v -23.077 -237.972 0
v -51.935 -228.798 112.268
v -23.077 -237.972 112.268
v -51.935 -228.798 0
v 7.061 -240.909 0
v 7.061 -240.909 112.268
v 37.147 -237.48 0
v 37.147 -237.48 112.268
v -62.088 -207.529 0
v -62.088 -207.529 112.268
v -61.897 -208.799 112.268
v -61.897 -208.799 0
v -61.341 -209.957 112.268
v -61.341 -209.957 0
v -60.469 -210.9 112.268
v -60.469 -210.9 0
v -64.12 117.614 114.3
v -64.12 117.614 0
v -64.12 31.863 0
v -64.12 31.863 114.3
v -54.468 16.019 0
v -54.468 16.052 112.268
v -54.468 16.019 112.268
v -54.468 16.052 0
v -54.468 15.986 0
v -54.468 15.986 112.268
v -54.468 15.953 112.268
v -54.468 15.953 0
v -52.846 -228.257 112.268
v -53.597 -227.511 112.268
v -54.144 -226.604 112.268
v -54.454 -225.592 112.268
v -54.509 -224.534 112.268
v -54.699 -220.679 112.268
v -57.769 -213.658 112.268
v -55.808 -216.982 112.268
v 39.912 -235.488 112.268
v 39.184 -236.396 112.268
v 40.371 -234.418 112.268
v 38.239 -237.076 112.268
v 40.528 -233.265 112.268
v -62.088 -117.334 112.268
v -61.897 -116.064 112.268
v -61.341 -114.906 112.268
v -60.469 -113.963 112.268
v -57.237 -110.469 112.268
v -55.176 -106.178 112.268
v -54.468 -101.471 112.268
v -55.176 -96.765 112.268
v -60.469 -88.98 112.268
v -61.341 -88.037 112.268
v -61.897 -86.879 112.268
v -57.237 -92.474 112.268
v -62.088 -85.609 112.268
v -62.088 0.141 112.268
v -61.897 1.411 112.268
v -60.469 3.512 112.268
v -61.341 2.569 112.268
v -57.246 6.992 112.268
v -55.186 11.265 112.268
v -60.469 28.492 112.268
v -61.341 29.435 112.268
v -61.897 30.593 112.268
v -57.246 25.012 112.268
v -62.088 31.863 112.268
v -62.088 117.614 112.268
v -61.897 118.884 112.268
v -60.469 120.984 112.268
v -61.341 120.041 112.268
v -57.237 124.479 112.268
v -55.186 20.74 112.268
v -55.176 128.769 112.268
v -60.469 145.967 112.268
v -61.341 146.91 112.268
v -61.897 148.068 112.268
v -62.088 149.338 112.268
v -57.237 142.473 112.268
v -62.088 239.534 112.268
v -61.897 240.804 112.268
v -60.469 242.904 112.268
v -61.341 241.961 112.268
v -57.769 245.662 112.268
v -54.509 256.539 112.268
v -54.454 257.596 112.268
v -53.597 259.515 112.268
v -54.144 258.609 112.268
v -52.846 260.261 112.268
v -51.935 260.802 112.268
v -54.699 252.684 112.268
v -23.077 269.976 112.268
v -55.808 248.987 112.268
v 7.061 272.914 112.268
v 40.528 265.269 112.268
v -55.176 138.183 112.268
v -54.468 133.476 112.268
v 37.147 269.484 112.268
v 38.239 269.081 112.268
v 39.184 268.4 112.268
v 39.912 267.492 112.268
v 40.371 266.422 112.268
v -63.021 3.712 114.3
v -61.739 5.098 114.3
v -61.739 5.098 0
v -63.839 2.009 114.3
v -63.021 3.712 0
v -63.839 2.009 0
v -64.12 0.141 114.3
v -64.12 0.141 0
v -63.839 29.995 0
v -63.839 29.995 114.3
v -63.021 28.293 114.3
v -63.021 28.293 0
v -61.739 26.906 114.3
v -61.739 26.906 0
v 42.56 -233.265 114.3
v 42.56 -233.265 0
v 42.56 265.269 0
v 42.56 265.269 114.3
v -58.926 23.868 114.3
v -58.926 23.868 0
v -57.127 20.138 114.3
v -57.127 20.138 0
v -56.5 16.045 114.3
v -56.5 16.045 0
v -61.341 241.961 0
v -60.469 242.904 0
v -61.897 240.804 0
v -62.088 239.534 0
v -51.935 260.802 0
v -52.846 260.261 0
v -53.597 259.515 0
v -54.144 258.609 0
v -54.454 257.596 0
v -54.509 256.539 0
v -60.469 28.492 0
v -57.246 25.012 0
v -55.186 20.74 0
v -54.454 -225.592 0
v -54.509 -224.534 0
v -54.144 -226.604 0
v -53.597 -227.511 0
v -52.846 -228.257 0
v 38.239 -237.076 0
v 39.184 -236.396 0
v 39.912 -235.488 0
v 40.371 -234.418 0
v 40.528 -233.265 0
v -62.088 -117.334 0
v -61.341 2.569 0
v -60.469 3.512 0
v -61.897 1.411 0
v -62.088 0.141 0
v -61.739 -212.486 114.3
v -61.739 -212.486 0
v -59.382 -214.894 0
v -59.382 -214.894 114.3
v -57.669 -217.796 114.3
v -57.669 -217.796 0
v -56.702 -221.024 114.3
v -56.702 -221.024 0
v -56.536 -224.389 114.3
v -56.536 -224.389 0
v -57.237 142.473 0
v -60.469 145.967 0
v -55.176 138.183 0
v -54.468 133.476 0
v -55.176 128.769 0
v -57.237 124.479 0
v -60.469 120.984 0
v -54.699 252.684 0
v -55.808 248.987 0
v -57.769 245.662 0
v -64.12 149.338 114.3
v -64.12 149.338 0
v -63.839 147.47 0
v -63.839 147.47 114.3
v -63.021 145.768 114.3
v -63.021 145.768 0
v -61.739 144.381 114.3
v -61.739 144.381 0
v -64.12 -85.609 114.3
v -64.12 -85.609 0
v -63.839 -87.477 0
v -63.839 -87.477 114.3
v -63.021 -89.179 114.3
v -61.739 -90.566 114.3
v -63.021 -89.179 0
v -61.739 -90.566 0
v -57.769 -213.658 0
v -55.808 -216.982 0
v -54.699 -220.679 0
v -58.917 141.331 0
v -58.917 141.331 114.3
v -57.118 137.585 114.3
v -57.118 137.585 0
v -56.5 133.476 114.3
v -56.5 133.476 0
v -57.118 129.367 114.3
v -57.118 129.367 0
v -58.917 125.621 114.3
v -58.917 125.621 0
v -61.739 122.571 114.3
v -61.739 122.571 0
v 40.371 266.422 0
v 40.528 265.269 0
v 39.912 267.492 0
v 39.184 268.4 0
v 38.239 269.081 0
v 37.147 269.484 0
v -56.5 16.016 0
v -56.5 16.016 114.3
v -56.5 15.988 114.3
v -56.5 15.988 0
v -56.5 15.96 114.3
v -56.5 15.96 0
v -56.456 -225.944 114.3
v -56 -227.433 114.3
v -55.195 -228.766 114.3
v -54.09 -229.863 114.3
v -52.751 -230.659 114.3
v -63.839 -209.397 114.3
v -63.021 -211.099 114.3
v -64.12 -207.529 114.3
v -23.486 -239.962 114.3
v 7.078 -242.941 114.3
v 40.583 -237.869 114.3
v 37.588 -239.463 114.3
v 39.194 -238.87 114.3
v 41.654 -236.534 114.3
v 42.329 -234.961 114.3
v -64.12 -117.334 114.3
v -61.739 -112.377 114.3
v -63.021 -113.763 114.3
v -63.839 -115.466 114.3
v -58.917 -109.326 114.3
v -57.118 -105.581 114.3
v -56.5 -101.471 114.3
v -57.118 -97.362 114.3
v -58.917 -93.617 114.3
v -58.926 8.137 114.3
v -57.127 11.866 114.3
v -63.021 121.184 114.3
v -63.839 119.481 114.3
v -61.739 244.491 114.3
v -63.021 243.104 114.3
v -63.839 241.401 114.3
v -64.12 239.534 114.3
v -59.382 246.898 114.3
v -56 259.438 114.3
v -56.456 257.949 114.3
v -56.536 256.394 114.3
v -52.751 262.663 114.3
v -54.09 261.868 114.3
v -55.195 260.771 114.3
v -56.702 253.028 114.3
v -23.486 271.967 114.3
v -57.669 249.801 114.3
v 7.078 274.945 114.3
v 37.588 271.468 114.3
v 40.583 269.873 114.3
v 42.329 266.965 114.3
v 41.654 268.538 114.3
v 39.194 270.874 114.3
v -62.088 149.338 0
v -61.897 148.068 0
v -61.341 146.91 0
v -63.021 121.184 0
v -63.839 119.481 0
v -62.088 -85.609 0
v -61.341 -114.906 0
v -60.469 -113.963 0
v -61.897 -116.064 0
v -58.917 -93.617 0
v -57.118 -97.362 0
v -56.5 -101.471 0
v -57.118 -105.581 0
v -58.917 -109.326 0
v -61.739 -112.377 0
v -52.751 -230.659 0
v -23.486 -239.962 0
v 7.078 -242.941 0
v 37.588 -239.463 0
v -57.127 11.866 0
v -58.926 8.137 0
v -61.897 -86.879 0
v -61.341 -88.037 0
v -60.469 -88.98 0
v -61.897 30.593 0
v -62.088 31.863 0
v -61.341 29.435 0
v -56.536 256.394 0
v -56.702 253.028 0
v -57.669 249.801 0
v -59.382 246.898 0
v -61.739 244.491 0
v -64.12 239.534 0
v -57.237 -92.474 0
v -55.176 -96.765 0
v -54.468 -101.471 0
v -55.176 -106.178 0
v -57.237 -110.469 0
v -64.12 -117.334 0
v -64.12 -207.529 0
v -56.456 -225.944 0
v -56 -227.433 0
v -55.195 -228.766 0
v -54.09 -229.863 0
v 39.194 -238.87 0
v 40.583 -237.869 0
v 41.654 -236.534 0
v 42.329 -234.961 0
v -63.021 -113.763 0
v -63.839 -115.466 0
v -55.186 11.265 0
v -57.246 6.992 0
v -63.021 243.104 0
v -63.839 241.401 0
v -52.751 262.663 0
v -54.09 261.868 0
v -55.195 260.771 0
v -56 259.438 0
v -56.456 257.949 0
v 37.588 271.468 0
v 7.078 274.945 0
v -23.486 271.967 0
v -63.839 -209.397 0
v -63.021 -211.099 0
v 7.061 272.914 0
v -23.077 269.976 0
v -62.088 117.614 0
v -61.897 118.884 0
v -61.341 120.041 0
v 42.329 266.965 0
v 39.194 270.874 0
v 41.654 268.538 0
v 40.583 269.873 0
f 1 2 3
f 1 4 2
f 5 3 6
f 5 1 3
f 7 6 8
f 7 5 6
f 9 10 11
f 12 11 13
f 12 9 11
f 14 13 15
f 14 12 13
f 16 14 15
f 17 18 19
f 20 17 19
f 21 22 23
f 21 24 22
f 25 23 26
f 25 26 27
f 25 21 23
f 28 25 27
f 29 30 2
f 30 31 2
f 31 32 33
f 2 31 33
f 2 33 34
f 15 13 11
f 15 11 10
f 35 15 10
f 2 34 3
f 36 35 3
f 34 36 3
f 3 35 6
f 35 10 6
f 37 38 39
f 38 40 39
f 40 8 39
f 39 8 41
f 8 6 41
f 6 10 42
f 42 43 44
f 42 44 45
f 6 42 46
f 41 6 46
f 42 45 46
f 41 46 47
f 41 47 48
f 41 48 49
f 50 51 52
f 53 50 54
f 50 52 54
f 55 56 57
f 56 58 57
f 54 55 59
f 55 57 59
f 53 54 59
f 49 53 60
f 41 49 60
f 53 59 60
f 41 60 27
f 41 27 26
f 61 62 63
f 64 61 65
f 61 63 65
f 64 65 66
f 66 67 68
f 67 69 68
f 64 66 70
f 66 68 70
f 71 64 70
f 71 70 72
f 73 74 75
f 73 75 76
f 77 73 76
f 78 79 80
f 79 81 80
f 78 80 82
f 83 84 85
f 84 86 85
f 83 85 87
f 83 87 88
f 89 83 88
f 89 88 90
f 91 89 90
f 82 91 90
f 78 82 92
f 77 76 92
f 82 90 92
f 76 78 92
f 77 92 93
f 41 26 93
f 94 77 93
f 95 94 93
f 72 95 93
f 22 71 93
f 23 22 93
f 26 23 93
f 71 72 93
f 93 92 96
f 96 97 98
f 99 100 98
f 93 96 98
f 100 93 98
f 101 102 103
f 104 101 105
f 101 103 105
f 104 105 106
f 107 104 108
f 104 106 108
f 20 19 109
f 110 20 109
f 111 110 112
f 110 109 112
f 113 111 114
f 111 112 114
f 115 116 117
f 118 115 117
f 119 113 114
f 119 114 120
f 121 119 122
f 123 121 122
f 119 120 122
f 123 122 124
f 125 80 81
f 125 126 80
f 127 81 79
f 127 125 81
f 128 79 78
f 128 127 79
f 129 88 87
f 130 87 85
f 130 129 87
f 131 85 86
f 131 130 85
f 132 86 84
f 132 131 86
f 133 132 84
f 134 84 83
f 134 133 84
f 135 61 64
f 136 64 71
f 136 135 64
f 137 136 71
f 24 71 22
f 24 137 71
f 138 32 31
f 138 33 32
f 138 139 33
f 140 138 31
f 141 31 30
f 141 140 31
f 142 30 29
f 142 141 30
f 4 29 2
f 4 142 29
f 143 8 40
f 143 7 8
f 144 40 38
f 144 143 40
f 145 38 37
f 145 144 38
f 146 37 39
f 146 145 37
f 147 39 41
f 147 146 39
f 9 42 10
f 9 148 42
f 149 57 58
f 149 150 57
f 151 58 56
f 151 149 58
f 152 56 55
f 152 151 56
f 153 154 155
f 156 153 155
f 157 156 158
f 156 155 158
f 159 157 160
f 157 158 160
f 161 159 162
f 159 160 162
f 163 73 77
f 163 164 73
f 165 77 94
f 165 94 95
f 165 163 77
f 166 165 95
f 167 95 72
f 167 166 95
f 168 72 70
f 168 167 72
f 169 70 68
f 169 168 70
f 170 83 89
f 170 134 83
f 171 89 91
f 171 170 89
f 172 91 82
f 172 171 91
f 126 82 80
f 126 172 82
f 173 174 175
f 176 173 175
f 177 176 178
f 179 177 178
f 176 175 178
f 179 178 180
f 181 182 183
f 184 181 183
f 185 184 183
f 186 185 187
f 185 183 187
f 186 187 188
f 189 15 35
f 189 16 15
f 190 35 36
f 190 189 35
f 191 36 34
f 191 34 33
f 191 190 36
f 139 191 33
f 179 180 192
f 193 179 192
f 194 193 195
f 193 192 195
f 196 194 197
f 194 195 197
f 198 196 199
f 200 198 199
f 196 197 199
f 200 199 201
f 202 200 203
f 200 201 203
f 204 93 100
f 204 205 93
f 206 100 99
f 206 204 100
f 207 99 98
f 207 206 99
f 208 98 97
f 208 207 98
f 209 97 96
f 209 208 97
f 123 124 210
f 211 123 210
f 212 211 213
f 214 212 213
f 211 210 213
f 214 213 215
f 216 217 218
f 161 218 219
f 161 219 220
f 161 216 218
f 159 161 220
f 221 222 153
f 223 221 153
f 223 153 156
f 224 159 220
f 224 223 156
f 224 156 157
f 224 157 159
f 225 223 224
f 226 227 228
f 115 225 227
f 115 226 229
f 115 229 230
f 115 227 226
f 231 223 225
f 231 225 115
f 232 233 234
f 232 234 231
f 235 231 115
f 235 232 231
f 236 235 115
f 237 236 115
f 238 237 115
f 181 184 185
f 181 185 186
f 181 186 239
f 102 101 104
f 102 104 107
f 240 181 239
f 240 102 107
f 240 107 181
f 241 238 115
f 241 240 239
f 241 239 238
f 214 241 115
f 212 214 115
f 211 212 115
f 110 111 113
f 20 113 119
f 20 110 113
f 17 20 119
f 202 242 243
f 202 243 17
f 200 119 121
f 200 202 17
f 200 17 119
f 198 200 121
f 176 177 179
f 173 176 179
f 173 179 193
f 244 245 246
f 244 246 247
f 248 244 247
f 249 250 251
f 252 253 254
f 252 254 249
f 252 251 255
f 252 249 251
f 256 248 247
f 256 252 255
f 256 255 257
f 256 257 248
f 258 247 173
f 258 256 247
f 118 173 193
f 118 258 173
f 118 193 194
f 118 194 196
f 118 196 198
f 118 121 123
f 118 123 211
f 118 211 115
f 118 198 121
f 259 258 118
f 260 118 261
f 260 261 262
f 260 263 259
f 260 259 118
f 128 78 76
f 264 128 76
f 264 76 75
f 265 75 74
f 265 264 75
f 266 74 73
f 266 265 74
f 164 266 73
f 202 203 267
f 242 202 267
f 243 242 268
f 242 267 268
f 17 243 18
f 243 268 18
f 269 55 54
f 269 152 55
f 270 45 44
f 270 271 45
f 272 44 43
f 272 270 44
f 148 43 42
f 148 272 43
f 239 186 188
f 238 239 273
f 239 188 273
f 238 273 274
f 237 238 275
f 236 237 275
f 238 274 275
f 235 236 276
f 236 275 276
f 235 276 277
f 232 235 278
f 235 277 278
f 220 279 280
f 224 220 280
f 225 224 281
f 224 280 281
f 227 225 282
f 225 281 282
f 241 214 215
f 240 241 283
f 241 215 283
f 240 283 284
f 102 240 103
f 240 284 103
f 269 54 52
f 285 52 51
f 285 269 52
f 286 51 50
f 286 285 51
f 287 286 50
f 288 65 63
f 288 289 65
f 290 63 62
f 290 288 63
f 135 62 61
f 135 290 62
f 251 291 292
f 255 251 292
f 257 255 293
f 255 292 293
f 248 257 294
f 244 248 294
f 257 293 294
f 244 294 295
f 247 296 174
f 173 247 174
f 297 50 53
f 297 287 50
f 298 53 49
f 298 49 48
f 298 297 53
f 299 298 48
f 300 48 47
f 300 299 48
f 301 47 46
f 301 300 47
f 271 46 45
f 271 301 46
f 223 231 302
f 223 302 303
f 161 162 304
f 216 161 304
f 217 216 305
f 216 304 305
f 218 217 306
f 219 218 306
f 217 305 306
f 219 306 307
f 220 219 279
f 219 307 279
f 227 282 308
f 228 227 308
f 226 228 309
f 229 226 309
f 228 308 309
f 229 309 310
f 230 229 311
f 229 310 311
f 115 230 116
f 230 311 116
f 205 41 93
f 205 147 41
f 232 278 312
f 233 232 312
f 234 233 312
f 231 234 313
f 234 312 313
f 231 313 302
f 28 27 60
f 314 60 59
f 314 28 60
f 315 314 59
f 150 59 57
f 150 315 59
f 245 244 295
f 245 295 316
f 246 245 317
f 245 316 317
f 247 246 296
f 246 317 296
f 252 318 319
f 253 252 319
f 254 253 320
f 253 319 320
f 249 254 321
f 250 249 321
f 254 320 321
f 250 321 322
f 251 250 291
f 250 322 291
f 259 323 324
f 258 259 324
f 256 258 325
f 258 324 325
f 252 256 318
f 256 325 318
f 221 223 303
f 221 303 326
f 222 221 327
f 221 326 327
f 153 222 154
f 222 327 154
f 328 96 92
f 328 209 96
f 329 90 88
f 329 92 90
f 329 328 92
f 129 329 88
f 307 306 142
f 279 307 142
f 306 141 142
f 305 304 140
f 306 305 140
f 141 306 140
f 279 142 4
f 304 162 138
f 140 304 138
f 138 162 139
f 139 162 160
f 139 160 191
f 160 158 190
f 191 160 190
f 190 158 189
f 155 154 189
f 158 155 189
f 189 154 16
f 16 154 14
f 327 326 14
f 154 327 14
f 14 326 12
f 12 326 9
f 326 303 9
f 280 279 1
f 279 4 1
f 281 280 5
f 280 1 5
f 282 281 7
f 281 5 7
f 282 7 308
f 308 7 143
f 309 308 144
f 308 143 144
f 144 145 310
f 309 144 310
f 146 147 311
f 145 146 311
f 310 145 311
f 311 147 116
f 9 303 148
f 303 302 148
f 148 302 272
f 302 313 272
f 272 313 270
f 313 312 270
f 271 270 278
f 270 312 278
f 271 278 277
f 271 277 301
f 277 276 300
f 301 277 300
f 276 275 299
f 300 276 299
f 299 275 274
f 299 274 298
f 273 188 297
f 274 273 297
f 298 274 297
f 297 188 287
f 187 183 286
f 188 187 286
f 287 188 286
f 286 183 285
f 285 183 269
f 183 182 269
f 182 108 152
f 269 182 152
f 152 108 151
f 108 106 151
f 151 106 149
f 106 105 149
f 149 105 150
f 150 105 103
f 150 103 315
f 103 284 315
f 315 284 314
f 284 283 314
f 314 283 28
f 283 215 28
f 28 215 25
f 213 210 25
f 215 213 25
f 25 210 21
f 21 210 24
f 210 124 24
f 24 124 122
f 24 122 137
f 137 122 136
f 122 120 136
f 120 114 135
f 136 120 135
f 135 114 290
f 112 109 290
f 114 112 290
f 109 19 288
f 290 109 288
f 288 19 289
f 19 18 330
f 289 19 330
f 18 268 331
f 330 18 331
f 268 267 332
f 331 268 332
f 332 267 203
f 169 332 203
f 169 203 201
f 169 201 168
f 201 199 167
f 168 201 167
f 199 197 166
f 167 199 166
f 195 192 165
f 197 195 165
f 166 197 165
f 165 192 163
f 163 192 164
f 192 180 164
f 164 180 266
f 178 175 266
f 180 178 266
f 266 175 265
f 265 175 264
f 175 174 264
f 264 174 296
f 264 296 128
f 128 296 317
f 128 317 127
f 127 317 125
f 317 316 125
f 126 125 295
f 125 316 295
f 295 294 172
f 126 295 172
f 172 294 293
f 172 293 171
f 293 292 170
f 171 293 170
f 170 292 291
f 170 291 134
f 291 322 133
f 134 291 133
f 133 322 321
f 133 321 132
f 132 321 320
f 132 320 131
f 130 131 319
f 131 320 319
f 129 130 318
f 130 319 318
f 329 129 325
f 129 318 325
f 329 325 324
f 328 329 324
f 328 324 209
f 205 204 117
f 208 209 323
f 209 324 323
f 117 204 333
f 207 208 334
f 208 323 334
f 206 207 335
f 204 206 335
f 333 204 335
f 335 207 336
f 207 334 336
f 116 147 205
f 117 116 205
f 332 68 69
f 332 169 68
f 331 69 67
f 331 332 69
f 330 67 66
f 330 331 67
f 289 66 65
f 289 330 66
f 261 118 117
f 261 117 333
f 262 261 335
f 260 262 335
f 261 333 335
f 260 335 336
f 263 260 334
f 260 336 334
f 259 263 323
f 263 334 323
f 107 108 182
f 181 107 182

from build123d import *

# Parameters (mm, degrees)
F1_DEPTH = 114.3
F2_T     = -2.032


# Not quite as in the source:
# - ends of sketch curves that miss each other by under 0.0002 mm in the source are joined


with BuildPart() as f1:
    # F0 (on Top) → F1 (new body)
    with BuildSketch(Plane.XY):
        with BuildLine():
            ThreePointArc((-56.5356683944, -224.3892894538), (-55.638228484, -228.1244435583), (-52.7512582129, -230.658645056))
            ThreePointArc((-52.7512582129, -230.658645056), (-8.2827450913, -242.2571362771), (37.5884612507, -239.4631988056))
            ThreePointArc((37.5884612507, -239.4631988056), (41.1635822204, -237.2376139869), (42.5600166876, -233.2646190823))
            Line((42.5600166876, -233.2646190823), (42.5600166876, 15.9969440547))
            Line((42.5600166876, 15.9969440547), (42.5600166876, 16.0075028557))
            Line((42.5600166876, 16.0075028557), (42.5600166876, 265.2690659926))
            ThreePointArc((42.5600166876, 265.2690659926), (41.1635822204, 269.2420608973), (37.5884612507, 271.467645716))
            ThreePointArc((37.5884612507, 271.467645716), (-8.2827450913, 274.2615831875), (-52.7512582129, 262.6630919663))
            ThreePointArc((-52.7512582129, 262.6630919663), (-55.638228484, 260.1288904686), (-56.5356683944, 256.3937363641))
            ThreePointArc((-56.5356683944, 256.3937363641), (-57.6694537634, 249.8005581937), (-61.7387333124, 244.4905269695))
            ThreePointArc((-61.7387333124, 244.4905269695), (-63.4937959622, 242.2831904653), (-64.1199833124, 239.5335598083))
            Line((-64.1199833124, 239.5335598083), (-64.1199833124, 149.3381496402))
            ThreePointArc((-64.1199833124, 149.3381496402), (-63.4937959622, 146.5885189832), (-61.7387333124, 144.3811824789))
            ThreePointArc((-61.7387333124, 144.3811824789), (-56.4999833124, 133.4758547242), (-61.7387333124, 122.5705269695))
            ThreePointArc((-61.7387333124, 122.5705269695), (-63.4937959622, 120.3631904653), (-64.1199833124, 117.6135598083))
            Line((-64.1199833124, 117.6135598083), (-64.1199833124, 31.8632195798))
            ThreePointArc((-64.1199833124, 31.8632195798), (-63.4937959622, 29.1135889227), (-61.7387333124, 26.9062524185))
            ThreePointArc((-61.7387333124, 26.9062524185), (-57.8871404165, 22.0699414424), (-56.5000526478, 16.044938603))
            ThreePointArc((-56.5000526478, 16.044938603), (-56.4999833728, 16.0022234616), (-56.5000526478, 15.9595083074))
            ThreePointArc((-56.5000526478, 15.9595083074), (-57.8871404165, 9.9345054679), (-61.7387333124, 5.0981944918))
            ThreePointArc((-61.7387333124, 5.0981944918), (-63.4937959622, 2.8908579876), (-64.1199833124, 0.1412273306))
            Line((-64.1199833124, 0.1412273306), (-64.1199833124, -85.609112898))
            ThreePointArc((-64.1199833124, -85.609112898), (-63.4937959622, -88.358743555), (-61.7387333124, -90.5660800592))
            ThreePointArc((-61.7387333124, -90.5660800592), (-56.4999833124, -101.4714078139), (-61.7387333124, -112.3767355686))
            ThreePointArc((-61.7387333124, -112.3767355686), (-63.4937959622, -114.5840720728), (-64.1199833124, -117.3337027298))
            Line((-64.1199833124, -117.3337027298), (-64.1199833124, -207.529112898))
            ThreePointArc((-64.1199833124, -207.529112898), (-63.4937959622, -210.278743555), (-61.7387333124, -212.4860800592))
            ThreePointArc((-61.7387333124, -212.4860800592), (-57.6694537634, -217.7961112834), (-56.5356683944, -224.3892894538))
        make_face()
    extrude(amount=F1_DEPTH)

    # F2
    f2_openings = [f1.faces().sort_by_distance(p)[0] for p in [
        (-9.762898, 16.002223, 0),
    ]]
    offset(amount=F2_T, openings=f2_openings, kind=Kind.INTERSECTION)


solid = f1.part
